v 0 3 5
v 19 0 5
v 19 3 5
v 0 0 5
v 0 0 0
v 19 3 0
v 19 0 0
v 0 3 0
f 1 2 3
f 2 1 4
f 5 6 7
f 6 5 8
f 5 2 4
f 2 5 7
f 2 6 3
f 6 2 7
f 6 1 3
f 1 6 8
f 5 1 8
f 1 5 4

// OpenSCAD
// Generated by SolidPython 1.0.1 on 2020-07-29 00:46:56


cube(size = [19, 3, 5]);
/***********************************************
*********      SolidPython code:      **********
************************************************
 
# import packages: SolidPython
from solid import *
from solid.utils import *
from itertools import chain, combinations, permutations


class Resize:

    def __init__(self, scad_file):
        self.scad_file = scad_file
        #self.scad_file = import_scad(scad_file)
        # cone/cylinder param:
        self.r1 = 0
        self.r2 = 0
        self.h = 0
        # rectangular prism param:
        self.w = 0
        self.l = 0
        # ellipse param:
        self.r = 0

    # import OpenScad code (file name corresponds to shape)


    # classify shape + parameters
    def assign(self, param1, param2, param3):
        if self.scad_file == 'cone.scad':
            self.r1 = param1
            self.r2 = param2
            self.h = param3
        elif self.scad_file == 'cylinder.scad':
            self.r1 = param1
            self.r2 = param2
            self.h = param3
        elif self.scad_file == 'rectangularPrism.scad':
            self.h = param1
            self.l = param2
            self.w = param3
        else:
            self.r = param1
            self.h = param2

    # resize parameters
    def iterate(self):
        x = range(3, 20, 2)
        i = 1
        if self.scad_file == 'cone.scad':
            tempList = list(permutations(x, 2))
            for temp in tempList:
                param1 = temp[0]
                param2 = temp[1]
                filepath = 'produced_scad_files/' + 'cone' + str(param1) + '_' + str(param2) + '_' + '.scad'
                scad_render_to_file(cylinder(h=param1, r1=param2, r2=0), filepath)

        elif self.scad_file == 'cylinder.scad':
            tempList = list(permutations(x, 3))
            for temp in tempList:
                param1 = temp[0]
                param2 = temp[1]
                filepath = 'produced_scad_files/' + 'cylinder' + str(param1) + '_' + str(param2) + '_' + '.scad'
                scad_render_to_file(cylinder(h=param1, r1=param2, r2=param2), filepath)

        elif self.scad_file == 'rectangularPrism.scad':
            tempList = list(permutations(x, 3))
            for temp in tempList:
                param1 = temp[0]
                param2 = temp[1]
                param3 = temp[2]
                filepath = 'produced_scad_files/' + 'rectangularPrism' + str(param1) + '_' + str(param2) + '_' + str(
                    param3) + '.scad'
                scad_render_to_file(cube(size=(param1, param2, param3)), filepath)

        elif self.scad_file == 'ellipse.scad':
            tempList = list(permutations(x, 4))
            for temp in tempList:
                param1 = temp[0]
                param2 = temp[1]
                param3 = temp[2]
                param4 = temp[3]
                filepath = 'produced_scad_files/' + 'ellipse' + str(param1) + '_' + str(param2) + '_' + str(param3) + '_' + str(param4) + '.scad'
                scad_render_to_file(scale([param1, param2, param3])(sphere(r=param4)), filepath)

    def render_to_scadfile(self):
        scad_render_to_file(scad, 'example.scad') 
 
************************************************/
